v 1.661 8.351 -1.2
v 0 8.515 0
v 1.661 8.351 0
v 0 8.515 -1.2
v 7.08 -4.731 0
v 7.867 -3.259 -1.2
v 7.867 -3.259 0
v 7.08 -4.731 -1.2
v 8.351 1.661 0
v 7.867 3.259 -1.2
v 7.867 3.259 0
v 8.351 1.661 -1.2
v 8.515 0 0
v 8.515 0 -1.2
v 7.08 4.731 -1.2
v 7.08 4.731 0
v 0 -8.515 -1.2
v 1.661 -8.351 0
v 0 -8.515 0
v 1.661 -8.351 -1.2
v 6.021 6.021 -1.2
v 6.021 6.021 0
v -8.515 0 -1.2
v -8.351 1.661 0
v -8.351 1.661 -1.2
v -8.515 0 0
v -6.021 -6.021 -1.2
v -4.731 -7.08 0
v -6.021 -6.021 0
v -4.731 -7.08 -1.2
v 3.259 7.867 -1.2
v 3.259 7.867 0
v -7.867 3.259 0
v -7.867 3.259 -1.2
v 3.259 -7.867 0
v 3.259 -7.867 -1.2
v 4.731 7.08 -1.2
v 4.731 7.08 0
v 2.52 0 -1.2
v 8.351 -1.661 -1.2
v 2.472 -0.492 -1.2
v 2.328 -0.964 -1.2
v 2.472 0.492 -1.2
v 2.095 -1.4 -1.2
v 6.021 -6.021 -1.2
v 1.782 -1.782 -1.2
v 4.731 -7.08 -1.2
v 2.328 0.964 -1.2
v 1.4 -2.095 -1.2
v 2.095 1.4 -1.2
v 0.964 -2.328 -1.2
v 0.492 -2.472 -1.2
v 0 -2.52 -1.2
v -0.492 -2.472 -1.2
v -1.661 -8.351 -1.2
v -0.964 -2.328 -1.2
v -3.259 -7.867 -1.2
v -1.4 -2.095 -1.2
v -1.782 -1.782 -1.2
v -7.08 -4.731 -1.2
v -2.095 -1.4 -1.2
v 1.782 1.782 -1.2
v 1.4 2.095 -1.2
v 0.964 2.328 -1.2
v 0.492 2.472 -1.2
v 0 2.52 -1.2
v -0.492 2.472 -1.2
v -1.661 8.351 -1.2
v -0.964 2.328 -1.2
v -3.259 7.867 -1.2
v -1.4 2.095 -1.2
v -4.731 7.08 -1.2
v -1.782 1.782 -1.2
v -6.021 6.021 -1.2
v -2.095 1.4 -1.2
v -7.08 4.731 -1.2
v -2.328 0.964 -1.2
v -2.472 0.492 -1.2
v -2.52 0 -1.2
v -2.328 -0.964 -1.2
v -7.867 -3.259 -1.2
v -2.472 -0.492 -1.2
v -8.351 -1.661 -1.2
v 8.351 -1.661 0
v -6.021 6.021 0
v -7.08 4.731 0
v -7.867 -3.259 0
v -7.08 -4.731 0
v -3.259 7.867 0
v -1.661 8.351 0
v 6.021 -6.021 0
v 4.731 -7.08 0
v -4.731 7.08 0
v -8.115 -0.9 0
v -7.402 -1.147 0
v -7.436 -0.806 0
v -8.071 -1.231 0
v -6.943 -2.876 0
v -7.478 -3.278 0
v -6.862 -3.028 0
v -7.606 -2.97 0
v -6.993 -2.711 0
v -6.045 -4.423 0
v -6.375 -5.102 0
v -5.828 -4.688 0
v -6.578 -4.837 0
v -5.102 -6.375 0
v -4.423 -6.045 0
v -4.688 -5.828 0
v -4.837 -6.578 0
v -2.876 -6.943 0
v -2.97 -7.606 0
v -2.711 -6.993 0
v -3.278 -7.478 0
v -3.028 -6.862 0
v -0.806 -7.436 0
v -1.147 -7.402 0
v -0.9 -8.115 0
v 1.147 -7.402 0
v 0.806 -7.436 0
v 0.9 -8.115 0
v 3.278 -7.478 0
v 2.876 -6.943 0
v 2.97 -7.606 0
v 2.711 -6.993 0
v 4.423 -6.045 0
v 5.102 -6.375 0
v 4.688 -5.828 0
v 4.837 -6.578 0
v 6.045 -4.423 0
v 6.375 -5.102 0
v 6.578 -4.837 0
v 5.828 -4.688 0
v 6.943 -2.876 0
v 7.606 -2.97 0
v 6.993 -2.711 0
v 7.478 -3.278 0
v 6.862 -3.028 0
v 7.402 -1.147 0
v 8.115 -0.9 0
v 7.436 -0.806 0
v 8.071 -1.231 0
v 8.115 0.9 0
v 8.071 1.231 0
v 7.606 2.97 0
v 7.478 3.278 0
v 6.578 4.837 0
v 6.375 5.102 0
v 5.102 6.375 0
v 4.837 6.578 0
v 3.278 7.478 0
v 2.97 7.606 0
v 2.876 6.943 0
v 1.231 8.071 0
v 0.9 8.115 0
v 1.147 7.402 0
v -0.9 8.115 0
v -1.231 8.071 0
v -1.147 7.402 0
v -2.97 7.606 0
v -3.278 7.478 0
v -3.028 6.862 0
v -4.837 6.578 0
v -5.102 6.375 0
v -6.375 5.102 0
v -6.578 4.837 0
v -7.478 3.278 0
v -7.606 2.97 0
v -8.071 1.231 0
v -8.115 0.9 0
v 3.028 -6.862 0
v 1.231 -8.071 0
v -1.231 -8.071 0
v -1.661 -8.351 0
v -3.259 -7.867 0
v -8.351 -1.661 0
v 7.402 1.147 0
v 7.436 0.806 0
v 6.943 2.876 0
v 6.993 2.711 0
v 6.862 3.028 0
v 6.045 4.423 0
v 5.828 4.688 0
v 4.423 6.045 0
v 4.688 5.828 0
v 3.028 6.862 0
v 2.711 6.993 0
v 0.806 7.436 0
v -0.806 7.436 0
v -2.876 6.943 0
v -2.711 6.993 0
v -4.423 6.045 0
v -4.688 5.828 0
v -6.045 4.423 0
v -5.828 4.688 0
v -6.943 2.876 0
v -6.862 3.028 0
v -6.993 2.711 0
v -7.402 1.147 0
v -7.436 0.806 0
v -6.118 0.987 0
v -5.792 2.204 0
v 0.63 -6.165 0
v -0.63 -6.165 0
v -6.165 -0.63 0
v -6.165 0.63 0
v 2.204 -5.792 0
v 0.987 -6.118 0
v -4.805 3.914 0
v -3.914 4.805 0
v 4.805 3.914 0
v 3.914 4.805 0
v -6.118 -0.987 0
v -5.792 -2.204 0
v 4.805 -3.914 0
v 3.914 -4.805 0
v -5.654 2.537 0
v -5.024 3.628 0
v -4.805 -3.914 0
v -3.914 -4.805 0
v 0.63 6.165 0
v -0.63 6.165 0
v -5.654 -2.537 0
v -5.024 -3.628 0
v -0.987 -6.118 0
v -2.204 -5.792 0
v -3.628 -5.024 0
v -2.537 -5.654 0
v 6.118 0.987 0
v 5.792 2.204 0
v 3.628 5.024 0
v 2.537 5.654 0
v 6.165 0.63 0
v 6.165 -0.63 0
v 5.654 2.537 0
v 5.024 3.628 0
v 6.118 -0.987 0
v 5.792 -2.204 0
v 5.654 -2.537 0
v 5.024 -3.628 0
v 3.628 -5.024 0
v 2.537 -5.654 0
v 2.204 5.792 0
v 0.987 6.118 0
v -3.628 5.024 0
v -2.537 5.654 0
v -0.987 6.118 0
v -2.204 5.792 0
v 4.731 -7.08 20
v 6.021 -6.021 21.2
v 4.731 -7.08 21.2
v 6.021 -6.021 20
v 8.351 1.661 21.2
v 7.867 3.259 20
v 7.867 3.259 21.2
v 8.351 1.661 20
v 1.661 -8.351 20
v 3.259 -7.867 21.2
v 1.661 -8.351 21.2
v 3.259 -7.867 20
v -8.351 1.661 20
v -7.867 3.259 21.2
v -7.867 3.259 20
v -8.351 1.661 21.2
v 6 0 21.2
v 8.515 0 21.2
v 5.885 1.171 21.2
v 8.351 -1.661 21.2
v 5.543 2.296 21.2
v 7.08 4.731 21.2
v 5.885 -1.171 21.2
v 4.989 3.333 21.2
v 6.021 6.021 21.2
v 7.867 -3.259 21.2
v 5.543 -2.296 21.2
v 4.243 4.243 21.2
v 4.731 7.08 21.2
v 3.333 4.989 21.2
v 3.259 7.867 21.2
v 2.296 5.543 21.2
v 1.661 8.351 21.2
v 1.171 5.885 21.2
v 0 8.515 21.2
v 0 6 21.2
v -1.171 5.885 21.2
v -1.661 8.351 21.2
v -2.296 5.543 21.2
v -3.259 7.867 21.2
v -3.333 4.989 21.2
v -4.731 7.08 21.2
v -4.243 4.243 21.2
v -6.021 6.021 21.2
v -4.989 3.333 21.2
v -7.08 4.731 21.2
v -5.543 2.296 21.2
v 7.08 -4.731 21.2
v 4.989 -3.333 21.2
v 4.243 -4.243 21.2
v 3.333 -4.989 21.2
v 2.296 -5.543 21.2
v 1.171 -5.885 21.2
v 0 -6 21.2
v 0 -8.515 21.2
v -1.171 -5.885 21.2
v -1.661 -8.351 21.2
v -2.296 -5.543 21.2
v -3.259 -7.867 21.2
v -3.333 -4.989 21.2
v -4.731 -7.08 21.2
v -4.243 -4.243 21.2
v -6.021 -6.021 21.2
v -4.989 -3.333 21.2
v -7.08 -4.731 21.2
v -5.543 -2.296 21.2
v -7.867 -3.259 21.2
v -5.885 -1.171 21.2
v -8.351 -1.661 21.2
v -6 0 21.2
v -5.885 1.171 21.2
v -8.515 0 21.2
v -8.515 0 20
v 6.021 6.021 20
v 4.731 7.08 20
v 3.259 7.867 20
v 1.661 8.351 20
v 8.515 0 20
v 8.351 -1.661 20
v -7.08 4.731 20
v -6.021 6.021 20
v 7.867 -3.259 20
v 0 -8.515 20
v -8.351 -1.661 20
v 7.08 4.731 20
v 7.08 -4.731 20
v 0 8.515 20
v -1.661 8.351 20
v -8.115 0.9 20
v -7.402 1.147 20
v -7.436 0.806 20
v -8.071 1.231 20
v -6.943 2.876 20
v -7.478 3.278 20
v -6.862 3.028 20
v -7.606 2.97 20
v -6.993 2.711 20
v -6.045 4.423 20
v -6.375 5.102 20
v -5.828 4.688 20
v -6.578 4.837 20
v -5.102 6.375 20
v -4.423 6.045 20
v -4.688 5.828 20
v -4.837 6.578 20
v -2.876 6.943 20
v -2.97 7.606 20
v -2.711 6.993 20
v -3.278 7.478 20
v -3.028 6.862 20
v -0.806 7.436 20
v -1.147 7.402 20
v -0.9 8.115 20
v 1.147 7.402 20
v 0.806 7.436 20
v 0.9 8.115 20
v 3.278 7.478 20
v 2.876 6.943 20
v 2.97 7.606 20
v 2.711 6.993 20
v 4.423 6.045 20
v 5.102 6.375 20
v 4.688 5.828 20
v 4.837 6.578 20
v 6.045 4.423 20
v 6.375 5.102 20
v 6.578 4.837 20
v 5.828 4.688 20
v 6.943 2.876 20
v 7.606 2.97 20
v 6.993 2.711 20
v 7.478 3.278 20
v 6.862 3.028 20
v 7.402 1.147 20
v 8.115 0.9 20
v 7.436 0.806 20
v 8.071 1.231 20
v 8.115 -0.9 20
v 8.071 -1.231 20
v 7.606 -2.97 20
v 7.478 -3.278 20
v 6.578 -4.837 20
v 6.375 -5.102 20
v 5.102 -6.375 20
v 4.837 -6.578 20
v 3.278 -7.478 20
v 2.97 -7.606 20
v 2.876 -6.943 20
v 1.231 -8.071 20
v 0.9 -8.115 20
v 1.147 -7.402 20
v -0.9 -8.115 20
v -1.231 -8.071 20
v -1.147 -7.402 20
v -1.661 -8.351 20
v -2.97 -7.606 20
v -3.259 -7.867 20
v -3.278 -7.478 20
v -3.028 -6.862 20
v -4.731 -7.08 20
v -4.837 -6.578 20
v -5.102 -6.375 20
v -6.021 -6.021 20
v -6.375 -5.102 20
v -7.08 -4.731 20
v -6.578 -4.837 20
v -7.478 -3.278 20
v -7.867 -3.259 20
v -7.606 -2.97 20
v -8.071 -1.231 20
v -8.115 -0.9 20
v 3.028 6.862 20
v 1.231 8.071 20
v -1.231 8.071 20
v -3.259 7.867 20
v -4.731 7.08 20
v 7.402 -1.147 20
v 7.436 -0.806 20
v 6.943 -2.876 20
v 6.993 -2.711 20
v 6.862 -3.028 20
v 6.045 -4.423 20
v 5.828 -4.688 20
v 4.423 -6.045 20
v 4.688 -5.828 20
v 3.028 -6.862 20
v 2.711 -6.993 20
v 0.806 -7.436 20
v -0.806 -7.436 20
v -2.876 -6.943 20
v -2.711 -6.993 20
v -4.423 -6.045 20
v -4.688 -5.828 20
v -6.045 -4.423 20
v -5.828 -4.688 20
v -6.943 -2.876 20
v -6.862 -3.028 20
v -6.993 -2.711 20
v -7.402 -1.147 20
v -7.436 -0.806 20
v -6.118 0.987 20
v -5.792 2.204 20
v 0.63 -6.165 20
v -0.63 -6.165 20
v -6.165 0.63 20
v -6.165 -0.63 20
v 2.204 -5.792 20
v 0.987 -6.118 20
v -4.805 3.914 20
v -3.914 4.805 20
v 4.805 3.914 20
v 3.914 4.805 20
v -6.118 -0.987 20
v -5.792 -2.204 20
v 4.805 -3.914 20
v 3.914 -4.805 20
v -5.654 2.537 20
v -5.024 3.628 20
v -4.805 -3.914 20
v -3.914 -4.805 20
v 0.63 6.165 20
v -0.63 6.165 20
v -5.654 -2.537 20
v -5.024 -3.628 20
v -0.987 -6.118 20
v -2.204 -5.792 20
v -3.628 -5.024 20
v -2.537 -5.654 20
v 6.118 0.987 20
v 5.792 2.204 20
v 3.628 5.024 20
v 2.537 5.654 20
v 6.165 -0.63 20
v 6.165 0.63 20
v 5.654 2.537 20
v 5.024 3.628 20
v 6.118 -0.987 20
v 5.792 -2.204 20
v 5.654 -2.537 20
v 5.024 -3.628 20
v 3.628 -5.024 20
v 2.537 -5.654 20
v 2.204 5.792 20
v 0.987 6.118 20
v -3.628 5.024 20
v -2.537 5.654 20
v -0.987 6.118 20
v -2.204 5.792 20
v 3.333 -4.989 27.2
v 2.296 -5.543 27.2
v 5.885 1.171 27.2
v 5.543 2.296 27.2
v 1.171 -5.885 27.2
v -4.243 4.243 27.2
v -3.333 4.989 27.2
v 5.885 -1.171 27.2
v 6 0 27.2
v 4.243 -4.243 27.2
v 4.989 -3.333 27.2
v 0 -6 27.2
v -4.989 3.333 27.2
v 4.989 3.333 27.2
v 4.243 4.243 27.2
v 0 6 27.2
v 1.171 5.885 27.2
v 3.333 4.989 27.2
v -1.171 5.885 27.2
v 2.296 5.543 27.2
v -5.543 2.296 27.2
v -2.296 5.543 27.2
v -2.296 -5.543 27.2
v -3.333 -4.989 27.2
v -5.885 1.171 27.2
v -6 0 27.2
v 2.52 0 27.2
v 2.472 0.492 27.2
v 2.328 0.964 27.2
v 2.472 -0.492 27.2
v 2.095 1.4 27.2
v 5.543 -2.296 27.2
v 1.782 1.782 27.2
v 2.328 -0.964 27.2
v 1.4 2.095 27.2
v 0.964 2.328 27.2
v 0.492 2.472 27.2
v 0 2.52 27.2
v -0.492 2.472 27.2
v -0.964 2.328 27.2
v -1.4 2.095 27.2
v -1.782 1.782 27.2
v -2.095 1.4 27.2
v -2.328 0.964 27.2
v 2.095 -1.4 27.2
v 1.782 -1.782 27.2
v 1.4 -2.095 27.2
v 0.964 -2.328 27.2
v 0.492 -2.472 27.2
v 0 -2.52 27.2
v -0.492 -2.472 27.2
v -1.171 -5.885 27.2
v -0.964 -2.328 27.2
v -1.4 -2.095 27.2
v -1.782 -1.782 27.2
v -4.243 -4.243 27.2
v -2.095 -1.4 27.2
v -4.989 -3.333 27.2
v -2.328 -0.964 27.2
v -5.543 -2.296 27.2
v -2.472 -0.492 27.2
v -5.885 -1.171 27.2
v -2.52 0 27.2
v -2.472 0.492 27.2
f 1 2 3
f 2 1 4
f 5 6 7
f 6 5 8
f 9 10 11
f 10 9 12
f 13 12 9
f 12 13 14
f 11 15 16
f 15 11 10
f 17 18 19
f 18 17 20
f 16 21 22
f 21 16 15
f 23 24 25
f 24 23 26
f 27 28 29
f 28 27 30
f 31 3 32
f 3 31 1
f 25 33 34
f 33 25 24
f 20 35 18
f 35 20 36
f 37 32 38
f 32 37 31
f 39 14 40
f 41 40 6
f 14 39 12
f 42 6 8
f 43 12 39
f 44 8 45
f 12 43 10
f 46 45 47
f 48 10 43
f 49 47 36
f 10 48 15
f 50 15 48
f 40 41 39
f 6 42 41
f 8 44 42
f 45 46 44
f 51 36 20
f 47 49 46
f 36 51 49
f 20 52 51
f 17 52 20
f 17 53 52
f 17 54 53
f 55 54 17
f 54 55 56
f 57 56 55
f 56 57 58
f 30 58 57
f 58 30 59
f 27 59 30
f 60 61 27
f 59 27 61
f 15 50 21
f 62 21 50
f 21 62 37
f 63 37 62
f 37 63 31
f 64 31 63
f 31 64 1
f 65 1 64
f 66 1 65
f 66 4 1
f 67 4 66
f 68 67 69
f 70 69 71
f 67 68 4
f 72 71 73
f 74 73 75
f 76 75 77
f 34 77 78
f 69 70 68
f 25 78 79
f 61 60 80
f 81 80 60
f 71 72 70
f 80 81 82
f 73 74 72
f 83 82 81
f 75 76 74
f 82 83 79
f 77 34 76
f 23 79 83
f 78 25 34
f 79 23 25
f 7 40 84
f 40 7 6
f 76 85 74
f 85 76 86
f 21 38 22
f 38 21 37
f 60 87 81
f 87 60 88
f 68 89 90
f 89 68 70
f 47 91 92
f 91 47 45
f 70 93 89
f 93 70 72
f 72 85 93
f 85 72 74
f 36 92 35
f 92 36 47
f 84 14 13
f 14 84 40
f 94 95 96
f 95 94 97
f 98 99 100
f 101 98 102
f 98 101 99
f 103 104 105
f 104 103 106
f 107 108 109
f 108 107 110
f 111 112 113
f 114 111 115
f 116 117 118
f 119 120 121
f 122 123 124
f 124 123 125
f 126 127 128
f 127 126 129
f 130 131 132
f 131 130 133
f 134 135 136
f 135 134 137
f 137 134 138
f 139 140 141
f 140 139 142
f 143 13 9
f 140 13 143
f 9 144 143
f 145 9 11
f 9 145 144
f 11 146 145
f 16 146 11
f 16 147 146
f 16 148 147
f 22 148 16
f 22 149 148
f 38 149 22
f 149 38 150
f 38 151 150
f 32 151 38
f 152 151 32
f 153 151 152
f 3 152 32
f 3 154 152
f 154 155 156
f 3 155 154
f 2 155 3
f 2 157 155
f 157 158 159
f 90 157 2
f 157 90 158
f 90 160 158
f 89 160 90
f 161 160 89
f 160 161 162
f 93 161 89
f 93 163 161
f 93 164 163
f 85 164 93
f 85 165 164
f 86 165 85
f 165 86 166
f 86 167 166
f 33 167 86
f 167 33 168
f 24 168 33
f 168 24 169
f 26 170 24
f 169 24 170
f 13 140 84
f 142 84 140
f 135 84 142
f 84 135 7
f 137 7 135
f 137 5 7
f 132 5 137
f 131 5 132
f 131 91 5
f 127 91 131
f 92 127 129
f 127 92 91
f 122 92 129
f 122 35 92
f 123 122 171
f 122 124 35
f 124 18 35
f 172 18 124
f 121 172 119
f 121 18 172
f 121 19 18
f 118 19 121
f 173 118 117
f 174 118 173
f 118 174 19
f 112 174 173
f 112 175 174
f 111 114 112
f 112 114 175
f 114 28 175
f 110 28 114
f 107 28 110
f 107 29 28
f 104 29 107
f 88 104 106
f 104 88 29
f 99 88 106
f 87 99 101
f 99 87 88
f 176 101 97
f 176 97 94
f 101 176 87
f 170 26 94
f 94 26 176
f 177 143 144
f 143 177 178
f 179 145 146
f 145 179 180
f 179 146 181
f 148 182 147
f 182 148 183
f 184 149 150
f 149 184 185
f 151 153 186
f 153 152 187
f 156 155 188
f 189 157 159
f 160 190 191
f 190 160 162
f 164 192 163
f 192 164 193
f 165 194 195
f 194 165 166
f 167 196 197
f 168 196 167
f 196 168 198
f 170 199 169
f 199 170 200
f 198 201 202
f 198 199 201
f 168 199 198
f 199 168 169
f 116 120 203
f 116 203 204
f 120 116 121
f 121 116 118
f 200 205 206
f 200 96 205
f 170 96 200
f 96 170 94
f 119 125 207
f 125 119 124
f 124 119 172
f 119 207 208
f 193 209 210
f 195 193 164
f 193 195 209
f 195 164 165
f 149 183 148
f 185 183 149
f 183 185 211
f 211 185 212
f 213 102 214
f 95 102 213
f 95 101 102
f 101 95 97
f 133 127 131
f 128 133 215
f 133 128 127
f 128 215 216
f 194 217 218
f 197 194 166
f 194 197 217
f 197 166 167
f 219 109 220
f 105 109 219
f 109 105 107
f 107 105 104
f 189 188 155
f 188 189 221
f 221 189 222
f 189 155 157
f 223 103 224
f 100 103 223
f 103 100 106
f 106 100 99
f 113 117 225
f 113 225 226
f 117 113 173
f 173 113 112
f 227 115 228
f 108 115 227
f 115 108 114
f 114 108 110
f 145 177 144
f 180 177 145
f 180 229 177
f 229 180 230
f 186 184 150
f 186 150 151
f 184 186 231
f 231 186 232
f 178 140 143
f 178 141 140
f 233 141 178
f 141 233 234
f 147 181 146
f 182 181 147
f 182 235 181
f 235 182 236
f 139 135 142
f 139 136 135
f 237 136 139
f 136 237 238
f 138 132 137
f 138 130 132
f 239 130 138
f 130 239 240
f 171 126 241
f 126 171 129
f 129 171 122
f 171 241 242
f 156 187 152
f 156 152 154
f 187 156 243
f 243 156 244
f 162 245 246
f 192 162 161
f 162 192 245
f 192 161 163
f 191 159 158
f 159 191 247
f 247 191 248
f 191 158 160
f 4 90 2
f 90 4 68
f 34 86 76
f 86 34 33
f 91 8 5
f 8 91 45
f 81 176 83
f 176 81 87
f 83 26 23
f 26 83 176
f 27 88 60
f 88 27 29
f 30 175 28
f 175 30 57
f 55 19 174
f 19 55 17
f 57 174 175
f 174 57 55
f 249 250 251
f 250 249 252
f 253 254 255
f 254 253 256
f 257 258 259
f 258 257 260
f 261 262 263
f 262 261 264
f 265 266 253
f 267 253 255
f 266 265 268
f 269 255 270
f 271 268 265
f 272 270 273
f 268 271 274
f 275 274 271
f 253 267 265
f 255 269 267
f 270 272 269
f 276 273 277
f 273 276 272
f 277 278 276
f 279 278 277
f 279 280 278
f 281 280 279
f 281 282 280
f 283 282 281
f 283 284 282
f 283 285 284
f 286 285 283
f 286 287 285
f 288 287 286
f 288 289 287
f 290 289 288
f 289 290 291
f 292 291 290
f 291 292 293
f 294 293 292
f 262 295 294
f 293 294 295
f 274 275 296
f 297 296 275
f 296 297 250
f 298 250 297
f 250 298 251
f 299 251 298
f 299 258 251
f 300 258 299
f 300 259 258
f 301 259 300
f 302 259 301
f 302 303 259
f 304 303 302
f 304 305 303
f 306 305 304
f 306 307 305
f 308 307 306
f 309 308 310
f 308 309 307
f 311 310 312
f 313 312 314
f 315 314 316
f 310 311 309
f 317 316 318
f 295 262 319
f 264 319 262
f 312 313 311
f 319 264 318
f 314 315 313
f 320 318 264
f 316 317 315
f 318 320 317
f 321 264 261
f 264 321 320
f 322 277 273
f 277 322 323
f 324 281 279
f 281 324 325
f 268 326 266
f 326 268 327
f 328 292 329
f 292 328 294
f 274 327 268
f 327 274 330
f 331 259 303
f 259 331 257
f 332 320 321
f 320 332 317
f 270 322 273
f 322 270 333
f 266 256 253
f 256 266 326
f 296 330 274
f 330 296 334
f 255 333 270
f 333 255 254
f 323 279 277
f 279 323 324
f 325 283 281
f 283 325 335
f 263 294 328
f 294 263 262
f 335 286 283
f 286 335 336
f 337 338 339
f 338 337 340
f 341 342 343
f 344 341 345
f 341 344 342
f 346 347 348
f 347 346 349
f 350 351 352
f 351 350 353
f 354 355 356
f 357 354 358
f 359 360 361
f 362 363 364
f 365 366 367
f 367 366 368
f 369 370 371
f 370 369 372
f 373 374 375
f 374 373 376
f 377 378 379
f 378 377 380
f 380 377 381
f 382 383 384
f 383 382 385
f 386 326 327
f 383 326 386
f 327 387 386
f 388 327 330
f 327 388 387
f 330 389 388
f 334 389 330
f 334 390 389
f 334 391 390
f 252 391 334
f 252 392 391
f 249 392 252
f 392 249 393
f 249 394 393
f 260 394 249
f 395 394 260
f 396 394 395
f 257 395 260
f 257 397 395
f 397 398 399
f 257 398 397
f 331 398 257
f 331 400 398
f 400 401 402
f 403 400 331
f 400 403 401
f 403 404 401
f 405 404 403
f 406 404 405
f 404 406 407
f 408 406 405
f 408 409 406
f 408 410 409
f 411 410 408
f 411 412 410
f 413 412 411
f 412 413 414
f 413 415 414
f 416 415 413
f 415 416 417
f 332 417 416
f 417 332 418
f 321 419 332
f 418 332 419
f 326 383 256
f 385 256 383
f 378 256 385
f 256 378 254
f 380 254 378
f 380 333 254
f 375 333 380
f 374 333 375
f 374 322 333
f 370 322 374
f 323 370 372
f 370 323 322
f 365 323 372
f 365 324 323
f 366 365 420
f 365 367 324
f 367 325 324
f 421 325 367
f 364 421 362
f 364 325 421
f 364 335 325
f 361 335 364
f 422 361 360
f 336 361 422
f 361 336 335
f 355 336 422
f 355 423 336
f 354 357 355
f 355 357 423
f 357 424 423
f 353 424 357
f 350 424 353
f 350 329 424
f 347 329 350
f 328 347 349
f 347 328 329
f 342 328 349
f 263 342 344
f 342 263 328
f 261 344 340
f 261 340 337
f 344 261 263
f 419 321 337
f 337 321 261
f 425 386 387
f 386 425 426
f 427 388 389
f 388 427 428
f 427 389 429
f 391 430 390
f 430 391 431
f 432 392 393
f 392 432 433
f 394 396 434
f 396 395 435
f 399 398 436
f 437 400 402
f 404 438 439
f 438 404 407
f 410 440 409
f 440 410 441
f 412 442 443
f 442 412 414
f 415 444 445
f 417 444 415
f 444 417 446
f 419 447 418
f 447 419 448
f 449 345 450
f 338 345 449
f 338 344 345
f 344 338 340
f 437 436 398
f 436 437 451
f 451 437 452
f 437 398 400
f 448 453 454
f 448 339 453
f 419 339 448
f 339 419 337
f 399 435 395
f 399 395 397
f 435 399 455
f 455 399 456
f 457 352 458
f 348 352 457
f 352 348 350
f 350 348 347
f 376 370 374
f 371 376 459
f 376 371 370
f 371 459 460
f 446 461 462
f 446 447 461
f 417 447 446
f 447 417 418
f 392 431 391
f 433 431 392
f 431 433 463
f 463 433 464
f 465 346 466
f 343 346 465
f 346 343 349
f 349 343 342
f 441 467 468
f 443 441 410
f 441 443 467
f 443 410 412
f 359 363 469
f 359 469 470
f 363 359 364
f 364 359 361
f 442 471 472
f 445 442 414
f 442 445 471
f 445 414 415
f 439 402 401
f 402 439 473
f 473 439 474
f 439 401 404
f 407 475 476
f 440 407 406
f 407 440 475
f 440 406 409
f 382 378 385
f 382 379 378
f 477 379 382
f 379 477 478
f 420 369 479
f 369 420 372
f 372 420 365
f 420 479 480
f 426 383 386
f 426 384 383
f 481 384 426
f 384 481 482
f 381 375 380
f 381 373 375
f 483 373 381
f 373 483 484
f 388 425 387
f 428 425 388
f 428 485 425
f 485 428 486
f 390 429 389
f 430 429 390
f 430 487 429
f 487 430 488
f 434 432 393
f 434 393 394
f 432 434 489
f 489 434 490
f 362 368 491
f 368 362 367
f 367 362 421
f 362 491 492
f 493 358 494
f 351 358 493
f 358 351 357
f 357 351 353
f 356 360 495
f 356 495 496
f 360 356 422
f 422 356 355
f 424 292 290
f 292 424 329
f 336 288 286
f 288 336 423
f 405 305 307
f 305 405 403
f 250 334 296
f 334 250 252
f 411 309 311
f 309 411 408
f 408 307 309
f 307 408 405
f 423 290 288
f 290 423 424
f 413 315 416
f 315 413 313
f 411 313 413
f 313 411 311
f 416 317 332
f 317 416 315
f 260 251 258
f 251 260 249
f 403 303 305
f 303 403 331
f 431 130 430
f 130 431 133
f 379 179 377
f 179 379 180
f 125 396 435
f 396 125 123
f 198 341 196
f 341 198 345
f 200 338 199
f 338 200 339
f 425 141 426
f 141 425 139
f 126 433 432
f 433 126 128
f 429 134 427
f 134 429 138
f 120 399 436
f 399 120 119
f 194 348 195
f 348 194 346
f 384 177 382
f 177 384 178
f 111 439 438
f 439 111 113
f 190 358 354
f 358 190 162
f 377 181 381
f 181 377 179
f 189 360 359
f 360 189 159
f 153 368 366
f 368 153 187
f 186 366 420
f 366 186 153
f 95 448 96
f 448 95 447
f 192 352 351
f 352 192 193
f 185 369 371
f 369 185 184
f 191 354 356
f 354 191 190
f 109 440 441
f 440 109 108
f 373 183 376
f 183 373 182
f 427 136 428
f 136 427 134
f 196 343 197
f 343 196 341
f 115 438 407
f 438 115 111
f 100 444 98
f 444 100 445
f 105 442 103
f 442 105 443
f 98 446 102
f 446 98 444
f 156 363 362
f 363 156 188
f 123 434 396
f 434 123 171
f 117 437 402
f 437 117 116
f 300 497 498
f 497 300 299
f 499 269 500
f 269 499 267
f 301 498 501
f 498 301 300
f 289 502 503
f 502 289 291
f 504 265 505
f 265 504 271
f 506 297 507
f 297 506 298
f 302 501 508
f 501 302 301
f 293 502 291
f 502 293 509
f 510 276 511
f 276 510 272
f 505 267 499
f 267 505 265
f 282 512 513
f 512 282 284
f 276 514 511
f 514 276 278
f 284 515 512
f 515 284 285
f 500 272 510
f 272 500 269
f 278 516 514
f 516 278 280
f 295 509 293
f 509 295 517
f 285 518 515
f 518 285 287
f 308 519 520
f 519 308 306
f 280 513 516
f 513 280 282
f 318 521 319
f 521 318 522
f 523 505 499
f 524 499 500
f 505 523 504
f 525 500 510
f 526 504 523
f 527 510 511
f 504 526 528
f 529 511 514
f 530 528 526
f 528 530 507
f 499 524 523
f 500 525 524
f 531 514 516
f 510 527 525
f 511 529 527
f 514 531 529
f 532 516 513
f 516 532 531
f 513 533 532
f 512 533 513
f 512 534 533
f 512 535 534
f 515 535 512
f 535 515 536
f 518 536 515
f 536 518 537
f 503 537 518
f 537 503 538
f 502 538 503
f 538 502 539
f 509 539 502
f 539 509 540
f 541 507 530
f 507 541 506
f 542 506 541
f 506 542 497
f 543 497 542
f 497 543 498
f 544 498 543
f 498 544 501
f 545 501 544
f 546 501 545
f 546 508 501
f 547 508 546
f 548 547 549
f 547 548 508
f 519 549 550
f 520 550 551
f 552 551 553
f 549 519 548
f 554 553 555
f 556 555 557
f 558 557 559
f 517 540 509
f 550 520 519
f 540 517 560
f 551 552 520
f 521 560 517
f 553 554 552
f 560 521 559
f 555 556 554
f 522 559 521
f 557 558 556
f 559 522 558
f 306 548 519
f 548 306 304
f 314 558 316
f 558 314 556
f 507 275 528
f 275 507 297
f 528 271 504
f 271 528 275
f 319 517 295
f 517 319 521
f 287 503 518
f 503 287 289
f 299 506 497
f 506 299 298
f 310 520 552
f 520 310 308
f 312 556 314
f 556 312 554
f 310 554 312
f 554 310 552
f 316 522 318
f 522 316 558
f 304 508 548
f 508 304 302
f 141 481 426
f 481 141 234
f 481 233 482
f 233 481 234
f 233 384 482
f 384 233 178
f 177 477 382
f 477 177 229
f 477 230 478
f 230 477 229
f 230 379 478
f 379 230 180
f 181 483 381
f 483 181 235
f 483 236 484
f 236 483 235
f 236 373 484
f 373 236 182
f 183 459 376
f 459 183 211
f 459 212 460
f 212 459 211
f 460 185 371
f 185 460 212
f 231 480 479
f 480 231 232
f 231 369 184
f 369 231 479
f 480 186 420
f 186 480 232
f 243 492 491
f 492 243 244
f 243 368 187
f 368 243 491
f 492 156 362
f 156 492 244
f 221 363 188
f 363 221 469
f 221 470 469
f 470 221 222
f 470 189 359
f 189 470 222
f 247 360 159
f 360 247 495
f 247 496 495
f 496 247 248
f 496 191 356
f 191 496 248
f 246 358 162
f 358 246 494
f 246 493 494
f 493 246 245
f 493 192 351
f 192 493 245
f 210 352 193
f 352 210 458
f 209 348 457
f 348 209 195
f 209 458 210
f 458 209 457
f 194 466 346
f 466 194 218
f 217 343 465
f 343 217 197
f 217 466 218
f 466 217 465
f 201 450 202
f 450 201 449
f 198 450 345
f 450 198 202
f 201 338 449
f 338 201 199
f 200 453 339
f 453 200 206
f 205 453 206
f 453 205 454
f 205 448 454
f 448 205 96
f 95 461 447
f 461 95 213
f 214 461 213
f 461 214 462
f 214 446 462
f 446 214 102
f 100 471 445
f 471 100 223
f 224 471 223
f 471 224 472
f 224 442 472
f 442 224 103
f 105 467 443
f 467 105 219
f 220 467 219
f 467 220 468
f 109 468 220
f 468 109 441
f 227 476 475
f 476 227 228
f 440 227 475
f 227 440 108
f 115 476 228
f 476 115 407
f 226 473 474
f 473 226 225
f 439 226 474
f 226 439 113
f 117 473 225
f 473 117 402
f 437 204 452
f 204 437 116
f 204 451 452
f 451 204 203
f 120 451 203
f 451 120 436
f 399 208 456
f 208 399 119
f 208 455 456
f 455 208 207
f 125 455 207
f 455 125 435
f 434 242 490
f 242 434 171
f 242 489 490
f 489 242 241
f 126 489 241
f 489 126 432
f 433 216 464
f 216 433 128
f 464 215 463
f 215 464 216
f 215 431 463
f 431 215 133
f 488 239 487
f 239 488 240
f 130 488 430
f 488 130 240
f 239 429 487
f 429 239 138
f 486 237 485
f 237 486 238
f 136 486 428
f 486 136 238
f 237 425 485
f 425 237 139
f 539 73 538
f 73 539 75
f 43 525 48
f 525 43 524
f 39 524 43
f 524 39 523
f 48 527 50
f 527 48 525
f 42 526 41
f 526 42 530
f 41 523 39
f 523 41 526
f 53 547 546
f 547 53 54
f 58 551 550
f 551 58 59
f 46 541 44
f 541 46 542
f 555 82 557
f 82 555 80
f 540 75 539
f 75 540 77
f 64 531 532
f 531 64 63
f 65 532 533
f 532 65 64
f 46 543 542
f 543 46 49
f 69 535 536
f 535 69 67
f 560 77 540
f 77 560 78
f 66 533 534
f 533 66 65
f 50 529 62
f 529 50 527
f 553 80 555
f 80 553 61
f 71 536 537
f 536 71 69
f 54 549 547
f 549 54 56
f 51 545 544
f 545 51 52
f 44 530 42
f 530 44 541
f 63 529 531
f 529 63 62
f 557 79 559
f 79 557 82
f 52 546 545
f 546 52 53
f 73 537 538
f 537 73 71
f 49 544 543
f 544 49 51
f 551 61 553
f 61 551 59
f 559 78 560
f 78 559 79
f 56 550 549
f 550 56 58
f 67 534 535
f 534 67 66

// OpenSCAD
$fn = 32;

// ----------------------------------------------------------------------
// Timing pulley: GT2 24T, pitch 2 mm, 17.03 mm x 28.4 mm
// ----------------------------------------------------------------------

// --- parameters (mm) ---
pitch_mm = 2;             // belt pitch
tooth_count = 24;         // number of grooves
width = 20;               // belt width between the flanges
tip_d = 15.03;            // tip circle diameter
root_d = 13.53;           // groove bottom diameter
groove_h = 0.75;          // groove depth
tooth_w = 1.5;            // groove width at the tip circle
side_d = 17.03;           // flange diameter
side_t = 1.2;             // flange thickness
spigot_d = 11.93;         // flange spigot, sunk into the rim
spigot_h = 1.2;           // spigot depth into the rim
hub_bore = 5.04;          // shaft bore
hub_d = 12;               // hub diameter
hub_h = 6;                // hub above the flange
bottom_z = -1.2;          // lowest point of the pulley
top_z = 27.2;             // highest point of the pulley

module rim() {
  cylinder(h = width, d = tip_d);
}

module groove_cutter() {
  /* belt tooth groove: deeper than wide, cut through the belt width */
  translate([root_d / 2, 0, 0])
    linear_extrude(height = width)
      polygon(points = [[-0.6, -tooth_w * 0.42], [groove_h + 0.6, -tooth_w * 0.6],
                        [groove_h + 0.6, tooth_w * 0.6], [-0.6, tooth_w * 0.42]]);
}

module flanges() {
  translate([0, 0, -side_t]) cylinder(h = side_t, d = side_d);
  translate([0, 0, width]) cylinder(h = side_t, d = side_d);
  translate([0, 0, -spigot_h]) cylinder(h = spigot_h + 0.6, d = spigot_d);
  translate([0, 0, width - 0.6]) cylinder(h = spigot_h + 0.6, d = spigot_d);
}

module hub() {
  translate([0, 0, bottom_z]) cylinder(h = top_z - bottom_z, d = hub_d);
}

difference() {
  union() {
    rim();
    hub();
    flanges();
  }
  for (i = [0 : tooth_count - 1]) rotate([0, 0, i * 360 / tooth_count]) groove_cutter();
  translate([0, 0, bottom_z - 1]) cylinder(h = top_z - bottom_z + 2, d = hub_bore);
}
